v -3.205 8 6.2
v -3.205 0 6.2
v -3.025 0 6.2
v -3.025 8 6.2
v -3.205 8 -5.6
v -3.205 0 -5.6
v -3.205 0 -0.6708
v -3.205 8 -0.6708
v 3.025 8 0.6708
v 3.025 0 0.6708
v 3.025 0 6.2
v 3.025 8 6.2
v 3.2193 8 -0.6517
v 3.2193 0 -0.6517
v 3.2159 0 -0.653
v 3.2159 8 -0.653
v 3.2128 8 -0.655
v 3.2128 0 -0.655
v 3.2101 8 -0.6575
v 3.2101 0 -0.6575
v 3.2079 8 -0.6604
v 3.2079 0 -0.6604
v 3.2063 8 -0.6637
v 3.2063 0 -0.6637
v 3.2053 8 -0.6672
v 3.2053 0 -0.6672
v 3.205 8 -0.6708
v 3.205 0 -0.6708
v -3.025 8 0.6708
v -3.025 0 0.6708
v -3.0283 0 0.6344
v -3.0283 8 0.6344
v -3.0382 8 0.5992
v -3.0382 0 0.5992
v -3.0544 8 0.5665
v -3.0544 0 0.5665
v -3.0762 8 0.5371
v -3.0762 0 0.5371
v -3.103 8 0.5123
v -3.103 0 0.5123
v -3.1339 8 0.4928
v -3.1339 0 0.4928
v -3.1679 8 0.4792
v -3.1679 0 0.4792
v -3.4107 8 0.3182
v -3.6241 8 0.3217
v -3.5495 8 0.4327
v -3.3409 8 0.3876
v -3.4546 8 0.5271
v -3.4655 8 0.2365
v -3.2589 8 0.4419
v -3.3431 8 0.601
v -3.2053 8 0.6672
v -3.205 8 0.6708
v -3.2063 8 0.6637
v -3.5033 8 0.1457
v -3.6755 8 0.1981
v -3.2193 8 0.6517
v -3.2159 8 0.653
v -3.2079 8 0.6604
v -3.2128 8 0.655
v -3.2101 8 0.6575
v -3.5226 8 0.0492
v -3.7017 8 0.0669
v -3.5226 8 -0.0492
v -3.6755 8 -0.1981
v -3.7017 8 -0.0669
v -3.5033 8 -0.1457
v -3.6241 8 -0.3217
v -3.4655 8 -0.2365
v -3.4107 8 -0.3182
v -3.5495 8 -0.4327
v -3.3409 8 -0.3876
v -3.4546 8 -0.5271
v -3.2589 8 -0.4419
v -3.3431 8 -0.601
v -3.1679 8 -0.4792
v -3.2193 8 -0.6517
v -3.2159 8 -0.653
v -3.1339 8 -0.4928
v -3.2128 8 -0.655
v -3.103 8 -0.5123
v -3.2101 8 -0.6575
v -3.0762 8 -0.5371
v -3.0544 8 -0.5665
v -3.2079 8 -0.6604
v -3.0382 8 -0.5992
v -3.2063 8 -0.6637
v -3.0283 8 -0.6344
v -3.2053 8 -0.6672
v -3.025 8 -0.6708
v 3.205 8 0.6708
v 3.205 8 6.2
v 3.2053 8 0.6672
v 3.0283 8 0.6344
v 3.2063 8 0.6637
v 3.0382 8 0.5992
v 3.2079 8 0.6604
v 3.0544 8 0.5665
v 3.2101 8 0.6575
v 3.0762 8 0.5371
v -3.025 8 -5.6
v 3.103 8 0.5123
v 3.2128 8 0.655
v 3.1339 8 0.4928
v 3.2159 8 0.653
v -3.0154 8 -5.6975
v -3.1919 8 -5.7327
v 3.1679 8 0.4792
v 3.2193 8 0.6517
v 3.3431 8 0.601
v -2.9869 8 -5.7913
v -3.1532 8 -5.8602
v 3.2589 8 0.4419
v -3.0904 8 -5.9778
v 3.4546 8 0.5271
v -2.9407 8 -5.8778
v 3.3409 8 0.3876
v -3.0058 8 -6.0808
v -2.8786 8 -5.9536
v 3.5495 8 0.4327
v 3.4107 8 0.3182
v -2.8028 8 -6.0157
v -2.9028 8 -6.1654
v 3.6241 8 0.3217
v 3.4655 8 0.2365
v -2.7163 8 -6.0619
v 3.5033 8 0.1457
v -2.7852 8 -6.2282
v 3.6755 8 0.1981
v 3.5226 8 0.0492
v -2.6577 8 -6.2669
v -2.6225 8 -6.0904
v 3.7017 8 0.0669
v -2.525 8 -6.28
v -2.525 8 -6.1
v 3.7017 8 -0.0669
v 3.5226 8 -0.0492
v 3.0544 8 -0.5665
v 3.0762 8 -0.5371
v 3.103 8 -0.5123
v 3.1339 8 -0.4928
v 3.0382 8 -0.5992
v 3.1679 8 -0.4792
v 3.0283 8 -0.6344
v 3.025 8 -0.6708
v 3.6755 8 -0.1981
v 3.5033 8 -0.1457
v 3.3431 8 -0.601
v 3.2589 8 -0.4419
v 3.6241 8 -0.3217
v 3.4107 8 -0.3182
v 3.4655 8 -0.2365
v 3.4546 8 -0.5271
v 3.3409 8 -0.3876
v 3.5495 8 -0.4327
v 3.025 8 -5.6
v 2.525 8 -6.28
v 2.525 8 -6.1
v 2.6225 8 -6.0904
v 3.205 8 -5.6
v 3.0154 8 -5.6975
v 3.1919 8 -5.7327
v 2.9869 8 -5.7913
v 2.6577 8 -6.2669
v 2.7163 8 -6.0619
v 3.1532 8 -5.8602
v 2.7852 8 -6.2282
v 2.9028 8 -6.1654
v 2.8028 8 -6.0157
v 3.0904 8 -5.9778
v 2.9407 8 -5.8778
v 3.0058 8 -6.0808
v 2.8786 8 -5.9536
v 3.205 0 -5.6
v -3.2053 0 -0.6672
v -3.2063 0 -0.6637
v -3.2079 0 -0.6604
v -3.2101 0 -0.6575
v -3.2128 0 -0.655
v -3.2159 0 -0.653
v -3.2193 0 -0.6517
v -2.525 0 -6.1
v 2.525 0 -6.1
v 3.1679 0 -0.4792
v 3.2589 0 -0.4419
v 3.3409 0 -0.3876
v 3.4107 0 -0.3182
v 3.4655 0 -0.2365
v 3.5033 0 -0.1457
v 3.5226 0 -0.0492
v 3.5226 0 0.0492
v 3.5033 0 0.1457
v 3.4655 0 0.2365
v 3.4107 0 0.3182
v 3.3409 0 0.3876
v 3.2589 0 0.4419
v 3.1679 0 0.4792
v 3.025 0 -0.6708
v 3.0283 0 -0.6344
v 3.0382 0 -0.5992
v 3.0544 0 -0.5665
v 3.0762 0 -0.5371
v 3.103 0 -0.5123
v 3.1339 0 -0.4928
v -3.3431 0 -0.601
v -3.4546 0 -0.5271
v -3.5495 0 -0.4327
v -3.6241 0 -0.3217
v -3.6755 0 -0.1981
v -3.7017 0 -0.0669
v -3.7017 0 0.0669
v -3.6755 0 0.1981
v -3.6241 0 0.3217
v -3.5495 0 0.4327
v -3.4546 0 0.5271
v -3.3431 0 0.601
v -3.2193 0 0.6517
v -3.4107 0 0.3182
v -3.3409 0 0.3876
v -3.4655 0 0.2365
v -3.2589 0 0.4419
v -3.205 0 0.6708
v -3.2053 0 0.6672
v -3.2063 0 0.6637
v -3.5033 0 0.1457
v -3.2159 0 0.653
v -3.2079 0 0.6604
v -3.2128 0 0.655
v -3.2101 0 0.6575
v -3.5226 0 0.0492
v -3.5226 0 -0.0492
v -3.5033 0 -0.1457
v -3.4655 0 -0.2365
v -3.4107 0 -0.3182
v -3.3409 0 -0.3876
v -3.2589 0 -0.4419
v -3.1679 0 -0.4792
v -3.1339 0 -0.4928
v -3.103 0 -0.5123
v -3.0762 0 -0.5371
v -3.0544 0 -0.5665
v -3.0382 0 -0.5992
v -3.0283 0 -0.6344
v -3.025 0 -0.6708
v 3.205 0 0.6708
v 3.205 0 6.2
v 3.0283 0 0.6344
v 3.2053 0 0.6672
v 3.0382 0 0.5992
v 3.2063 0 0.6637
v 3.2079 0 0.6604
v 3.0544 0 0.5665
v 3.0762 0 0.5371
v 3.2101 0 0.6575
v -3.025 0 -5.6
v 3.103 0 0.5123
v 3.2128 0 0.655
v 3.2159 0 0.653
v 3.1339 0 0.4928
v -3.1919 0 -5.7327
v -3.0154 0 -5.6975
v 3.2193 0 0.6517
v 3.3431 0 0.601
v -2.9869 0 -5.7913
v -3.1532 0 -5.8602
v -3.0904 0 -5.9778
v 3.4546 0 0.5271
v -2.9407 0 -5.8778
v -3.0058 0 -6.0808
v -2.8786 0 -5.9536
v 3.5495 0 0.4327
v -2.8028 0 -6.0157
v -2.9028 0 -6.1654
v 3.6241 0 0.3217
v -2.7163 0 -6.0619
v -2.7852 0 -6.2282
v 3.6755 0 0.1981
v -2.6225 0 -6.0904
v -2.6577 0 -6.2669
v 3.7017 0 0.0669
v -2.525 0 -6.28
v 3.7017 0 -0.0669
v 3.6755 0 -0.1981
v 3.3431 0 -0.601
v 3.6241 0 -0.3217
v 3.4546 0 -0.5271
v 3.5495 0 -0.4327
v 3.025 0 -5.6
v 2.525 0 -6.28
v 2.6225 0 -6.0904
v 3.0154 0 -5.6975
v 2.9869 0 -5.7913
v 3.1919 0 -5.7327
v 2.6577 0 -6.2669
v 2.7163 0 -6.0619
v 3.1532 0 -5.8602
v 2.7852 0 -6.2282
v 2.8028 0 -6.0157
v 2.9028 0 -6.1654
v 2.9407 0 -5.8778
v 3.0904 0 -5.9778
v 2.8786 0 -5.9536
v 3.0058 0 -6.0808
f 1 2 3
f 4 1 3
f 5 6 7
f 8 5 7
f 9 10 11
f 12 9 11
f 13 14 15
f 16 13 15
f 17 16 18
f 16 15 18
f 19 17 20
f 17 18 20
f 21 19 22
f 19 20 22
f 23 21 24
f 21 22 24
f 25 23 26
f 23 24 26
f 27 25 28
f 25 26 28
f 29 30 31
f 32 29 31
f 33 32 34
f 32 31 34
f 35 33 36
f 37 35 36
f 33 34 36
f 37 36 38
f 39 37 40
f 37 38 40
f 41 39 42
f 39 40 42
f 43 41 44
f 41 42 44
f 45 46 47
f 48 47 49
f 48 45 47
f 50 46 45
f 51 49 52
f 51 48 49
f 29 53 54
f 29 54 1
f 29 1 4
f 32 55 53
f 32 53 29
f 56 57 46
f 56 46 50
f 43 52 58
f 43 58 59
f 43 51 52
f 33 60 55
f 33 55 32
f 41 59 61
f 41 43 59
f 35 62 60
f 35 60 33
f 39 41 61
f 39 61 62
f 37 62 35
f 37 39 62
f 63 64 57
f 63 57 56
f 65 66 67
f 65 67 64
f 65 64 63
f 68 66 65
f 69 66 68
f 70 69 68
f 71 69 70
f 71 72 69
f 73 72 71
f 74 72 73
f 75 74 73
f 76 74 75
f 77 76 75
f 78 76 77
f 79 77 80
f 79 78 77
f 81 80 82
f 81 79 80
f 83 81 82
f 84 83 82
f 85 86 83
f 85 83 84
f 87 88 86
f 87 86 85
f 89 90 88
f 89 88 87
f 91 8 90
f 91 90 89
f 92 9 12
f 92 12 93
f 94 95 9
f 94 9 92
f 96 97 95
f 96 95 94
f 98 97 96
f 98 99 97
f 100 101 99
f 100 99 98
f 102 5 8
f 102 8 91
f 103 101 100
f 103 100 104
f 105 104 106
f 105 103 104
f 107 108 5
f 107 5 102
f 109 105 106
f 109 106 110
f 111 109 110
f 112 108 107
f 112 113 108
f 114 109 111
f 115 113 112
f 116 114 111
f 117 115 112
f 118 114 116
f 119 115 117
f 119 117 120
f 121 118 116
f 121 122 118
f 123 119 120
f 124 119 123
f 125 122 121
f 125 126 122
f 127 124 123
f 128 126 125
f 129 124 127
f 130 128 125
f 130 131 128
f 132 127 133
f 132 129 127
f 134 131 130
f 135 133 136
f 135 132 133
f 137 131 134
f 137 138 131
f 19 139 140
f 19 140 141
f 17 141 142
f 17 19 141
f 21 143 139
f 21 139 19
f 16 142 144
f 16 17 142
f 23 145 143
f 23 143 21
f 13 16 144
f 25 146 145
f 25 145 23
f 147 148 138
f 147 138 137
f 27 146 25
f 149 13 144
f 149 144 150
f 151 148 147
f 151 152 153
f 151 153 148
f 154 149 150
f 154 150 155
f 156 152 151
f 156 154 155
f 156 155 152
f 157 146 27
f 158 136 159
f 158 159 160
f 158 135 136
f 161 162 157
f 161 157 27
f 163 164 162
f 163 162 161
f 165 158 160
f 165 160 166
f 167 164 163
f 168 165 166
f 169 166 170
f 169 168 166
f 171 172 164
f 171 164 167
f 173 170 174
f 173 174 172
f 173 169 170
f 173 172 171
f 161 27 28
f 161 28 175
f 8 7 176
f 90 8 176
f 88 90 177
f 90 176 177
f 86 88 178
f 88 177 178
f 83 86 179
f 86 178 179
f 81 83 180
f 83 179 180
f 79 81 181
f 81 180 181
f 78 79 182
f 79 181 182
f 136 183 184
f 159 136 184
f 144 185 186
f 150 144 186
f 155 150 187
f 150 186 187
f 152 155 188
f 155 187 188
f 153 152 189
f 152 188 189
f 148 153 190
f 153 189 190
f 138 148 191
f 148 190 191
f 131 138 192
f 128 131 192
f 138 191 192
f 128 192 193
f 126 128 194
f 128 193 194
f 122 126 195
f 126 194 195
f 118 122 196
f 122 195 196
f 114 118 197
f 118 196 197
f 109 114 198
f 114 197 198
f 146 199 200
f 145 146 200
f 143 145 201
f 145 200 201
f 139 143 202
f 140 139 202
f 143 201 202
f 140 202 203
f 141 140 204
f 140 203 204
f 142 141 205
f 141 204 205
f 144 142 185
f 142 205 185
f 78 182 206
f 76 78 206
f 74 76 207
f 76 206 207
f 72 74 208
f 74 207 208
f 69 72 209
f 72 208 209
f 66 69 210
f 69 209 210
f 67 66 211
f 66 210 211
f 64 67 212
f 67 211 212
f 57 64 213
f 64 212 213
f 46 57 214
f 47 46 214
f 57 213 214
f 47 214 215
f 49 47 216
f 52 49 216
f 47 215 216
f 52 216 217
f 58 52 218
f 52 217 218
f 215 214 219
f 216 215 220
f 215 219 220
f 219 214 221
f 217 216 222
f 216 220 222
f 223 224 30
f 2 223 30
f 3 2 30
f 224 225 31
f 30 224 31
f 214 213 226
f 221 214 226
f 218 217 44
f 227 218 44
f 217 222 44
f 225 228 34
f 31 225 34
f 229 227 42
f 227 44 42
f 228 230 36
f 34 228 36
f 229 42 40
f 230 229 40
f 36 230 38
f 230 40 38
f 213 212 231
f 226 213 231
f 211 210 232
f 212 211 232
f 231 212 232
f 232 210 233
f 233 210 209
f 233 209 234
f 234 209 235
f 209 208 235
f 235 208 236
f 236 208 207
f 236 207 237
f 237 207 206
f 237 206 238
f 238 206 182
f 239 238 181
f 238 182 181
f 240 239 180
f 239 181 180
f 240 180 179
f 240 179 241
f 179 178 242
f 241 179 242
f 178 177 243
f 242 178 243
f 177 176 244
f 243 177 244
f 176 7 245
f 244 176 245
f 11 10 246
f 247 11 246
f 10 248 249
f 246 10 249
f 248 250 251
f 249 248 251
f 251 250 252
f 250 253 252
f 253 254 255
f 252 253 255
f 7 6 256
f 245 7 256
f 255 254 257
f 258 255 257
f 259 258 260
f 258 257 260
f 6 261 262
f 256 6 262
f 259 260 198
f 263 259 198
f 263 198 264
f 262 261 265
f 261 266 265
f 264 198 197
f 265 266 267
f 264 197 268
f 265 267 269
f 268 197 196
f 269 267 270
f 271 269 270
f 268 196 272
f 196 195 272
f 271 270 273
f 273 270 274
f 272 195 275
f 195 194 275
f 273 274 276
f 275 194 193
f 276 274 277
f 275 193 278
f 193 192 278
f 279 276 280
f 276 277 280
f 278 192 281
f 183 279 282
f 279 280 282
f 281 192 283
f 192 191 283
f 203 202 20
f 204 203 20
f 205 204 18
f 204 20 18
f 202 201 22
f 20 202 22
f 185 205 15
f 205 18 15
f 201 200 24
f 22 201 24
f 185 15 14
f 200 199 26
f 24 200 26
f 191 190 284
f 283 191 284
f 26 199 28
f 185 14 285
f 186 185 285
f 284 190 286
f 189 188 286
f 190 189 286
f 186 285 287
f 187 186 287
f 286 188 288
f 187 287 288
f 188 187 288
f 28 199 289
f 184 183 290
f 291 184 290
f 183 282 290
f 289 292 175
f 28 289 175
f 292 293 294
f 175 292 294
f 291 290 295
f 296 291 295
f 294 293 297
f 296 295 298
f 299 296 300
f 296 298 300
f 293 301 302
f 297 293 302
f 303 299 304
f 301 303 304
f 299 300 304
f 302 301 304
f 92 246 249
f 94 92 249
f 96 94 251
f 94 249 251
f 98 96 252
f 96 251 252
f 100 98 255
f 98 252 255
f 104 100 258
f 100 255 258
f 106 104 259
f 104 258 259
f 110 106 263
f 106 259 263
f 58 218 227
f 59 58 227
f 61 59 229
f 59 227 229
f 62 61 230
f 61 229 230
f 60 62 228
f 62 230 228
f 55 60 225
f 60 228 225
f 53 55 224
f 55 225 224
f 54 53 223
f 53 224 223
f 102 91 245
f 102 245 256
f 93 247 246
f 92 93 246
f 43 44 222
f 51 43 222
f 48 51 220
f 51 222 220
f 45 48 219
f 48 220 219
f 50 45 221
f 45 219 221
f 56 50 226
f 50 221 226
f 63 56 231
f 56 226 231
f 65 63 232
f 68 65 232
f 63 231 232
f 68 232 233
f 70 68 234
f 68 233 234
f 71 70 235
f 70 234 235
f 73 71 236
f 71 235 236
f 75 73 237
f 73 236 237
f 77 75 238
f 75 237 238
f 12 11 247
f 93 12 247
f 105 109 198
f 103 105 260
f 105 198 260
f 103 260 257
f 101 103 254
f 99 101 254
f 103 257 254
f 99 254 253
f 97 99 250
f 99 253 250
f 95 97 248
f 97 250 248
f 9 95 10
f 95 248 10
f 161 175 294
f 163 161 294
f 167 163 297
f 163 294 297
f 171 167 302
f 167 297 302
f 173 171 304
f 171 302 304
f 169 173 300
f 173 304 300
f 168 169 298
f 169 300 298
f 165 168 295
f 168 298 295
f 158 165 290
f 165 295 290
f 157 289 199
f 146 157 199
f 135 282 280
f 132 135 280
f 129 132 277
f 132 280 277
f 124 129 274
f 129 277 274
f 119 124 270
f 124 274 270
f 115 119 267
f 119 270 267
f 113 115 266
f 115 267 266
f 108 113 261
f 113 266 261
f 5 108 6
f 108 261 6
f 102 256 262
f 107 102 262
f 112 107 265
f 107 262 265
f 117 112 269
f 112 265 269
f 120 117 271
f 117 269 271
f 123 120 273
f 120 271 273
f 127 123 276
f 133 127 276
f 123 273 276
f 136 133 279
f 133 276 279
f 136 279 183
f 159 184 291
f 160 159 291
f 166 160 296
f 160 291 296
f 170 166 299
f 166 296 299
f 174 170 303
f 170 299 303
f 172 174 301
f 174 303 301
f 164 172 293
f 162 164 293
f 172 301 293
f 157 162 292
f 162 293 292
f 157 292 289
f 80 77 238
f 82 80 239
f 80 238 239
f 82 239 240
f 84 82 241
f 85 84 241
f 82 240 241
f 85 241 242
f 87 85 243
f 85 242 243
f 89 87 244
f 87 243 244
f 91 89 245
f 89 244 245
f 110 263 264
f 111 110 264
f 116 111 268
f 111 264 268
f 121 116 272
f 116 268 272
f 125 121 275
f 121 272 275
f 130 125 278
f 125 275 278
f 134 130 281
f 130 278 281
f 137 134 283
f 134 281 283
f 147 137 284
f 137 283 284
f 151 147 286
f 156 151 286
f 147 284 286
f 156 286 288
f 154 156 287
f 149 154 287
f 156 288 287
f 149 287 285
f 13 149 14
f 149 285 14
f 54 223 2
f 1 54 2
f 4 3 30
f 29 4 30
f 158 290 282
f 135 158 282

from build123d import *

# Parameters (mm, degrees)
EXTRUDE_THIN1_DEPTH = 8


with BuildPart() as part:
    # Sketch1 → Extrude-Thin1 (new body)
    with BuildSketch(Plane(origin=(0, 0, 0), x_dir=(1, 0, 0), z_dir=(0, 1, 0))):
        with BuildLine():
            Line((-3.025, -6.2), (-3.025, -0.670820393))
            ThreePointArc((-3.025, -0.670820393), (-3.064643255, -0.551297532), (-3.167857143, -0.479157424))
            ThreePointArc((-3.167857143, -0.479157424), (-3.525, 0), (-3.167857143, 0.479157424))
            ThreePointArc((-3.167857143, 0.479157424), (-3.064643255, 0.551297532), (-3.025, 0.670820393))
            Line((-3.025, 0.670820393), (-3.025, 5.6))
            ThreePointArc((-3.025, 5.6), (-2.878553391, 5.953553391), (-2.525, 6.1))
            Line((-2.525, 6.1), (2.525, 6.1))
            ThreePointArc((2.525, 6.1), (2.878553391, 5.953553391), (3.025, 5.6))
            Line((3.025, 5.6), (3.025, 0.670820393))
            ThreePointArc((3.025, 0.670820393), (3.064643255, 0.551297532), (3.167857143, 0.479157424))
            ThreePointArc((3.167857143, 0.479157424), (3.525, 0), (3.167857143, -0.479157424))
            ThreePointArc((3.167857143, -0.479157424), (3.064643255, -0.551297532), (3.025, -0.670820393))
            Line((3.025, -0.670820393), (3.025, -6.2))
            Line((3.025, -6.2), (3.205, -6.2))
            Line((3.205, -6.2), (3.205, -0.670820393))
            ThreePointArc((3.205, -0.670820393), (3.208964325, -0.658868107), (3.219285714, -0.651654096))
            ThreePointArc((3.219285714, -0.651654096), (3.705, 0), (3.219285714, 0.651654096))
            ThreePointArc((3.219285714, 0.651654096), (3.208964325, 0.658868107), (3.205, 0.670820393))
            Line((3.205, 0.670820393), (3.205, 5.6))
            ThreePointArc((3.205, 5.6), (3.005832611, 6.080832611), (2.525, 6.28))
            Line((2.525, 6.28), (-2.525, 6.28))
            ThreePointArc((-2.525, 6.28), (-3.005832611, 6.080832611), (-3.205, 5.6))
            Line((-3.205, 5.6), (-3.205, 0.670820393))
            ThreePointArc((-3.205, 0.670820393), (-3.208964325, 0.658868107), (-3.219285714, 0.651654096))
            ThreePointArc((-3.219285714, 0.651654096), (-3.705, 0), (-3.219285714, -0.651654096))
            ThreePointArc((-3.219285714, -0.651654096), (-3.208964325, -0.658868107), (-3.205, -0.670820393))
            Line((-3.205, -0.670820393), (-3.205, -6.2))
            Line((-3.205, -6.2), (-3.025, -6.2))
        make_face()
    extrude(amount=EXTRUDE_THIN1_DEPTH)


solid = part.part
